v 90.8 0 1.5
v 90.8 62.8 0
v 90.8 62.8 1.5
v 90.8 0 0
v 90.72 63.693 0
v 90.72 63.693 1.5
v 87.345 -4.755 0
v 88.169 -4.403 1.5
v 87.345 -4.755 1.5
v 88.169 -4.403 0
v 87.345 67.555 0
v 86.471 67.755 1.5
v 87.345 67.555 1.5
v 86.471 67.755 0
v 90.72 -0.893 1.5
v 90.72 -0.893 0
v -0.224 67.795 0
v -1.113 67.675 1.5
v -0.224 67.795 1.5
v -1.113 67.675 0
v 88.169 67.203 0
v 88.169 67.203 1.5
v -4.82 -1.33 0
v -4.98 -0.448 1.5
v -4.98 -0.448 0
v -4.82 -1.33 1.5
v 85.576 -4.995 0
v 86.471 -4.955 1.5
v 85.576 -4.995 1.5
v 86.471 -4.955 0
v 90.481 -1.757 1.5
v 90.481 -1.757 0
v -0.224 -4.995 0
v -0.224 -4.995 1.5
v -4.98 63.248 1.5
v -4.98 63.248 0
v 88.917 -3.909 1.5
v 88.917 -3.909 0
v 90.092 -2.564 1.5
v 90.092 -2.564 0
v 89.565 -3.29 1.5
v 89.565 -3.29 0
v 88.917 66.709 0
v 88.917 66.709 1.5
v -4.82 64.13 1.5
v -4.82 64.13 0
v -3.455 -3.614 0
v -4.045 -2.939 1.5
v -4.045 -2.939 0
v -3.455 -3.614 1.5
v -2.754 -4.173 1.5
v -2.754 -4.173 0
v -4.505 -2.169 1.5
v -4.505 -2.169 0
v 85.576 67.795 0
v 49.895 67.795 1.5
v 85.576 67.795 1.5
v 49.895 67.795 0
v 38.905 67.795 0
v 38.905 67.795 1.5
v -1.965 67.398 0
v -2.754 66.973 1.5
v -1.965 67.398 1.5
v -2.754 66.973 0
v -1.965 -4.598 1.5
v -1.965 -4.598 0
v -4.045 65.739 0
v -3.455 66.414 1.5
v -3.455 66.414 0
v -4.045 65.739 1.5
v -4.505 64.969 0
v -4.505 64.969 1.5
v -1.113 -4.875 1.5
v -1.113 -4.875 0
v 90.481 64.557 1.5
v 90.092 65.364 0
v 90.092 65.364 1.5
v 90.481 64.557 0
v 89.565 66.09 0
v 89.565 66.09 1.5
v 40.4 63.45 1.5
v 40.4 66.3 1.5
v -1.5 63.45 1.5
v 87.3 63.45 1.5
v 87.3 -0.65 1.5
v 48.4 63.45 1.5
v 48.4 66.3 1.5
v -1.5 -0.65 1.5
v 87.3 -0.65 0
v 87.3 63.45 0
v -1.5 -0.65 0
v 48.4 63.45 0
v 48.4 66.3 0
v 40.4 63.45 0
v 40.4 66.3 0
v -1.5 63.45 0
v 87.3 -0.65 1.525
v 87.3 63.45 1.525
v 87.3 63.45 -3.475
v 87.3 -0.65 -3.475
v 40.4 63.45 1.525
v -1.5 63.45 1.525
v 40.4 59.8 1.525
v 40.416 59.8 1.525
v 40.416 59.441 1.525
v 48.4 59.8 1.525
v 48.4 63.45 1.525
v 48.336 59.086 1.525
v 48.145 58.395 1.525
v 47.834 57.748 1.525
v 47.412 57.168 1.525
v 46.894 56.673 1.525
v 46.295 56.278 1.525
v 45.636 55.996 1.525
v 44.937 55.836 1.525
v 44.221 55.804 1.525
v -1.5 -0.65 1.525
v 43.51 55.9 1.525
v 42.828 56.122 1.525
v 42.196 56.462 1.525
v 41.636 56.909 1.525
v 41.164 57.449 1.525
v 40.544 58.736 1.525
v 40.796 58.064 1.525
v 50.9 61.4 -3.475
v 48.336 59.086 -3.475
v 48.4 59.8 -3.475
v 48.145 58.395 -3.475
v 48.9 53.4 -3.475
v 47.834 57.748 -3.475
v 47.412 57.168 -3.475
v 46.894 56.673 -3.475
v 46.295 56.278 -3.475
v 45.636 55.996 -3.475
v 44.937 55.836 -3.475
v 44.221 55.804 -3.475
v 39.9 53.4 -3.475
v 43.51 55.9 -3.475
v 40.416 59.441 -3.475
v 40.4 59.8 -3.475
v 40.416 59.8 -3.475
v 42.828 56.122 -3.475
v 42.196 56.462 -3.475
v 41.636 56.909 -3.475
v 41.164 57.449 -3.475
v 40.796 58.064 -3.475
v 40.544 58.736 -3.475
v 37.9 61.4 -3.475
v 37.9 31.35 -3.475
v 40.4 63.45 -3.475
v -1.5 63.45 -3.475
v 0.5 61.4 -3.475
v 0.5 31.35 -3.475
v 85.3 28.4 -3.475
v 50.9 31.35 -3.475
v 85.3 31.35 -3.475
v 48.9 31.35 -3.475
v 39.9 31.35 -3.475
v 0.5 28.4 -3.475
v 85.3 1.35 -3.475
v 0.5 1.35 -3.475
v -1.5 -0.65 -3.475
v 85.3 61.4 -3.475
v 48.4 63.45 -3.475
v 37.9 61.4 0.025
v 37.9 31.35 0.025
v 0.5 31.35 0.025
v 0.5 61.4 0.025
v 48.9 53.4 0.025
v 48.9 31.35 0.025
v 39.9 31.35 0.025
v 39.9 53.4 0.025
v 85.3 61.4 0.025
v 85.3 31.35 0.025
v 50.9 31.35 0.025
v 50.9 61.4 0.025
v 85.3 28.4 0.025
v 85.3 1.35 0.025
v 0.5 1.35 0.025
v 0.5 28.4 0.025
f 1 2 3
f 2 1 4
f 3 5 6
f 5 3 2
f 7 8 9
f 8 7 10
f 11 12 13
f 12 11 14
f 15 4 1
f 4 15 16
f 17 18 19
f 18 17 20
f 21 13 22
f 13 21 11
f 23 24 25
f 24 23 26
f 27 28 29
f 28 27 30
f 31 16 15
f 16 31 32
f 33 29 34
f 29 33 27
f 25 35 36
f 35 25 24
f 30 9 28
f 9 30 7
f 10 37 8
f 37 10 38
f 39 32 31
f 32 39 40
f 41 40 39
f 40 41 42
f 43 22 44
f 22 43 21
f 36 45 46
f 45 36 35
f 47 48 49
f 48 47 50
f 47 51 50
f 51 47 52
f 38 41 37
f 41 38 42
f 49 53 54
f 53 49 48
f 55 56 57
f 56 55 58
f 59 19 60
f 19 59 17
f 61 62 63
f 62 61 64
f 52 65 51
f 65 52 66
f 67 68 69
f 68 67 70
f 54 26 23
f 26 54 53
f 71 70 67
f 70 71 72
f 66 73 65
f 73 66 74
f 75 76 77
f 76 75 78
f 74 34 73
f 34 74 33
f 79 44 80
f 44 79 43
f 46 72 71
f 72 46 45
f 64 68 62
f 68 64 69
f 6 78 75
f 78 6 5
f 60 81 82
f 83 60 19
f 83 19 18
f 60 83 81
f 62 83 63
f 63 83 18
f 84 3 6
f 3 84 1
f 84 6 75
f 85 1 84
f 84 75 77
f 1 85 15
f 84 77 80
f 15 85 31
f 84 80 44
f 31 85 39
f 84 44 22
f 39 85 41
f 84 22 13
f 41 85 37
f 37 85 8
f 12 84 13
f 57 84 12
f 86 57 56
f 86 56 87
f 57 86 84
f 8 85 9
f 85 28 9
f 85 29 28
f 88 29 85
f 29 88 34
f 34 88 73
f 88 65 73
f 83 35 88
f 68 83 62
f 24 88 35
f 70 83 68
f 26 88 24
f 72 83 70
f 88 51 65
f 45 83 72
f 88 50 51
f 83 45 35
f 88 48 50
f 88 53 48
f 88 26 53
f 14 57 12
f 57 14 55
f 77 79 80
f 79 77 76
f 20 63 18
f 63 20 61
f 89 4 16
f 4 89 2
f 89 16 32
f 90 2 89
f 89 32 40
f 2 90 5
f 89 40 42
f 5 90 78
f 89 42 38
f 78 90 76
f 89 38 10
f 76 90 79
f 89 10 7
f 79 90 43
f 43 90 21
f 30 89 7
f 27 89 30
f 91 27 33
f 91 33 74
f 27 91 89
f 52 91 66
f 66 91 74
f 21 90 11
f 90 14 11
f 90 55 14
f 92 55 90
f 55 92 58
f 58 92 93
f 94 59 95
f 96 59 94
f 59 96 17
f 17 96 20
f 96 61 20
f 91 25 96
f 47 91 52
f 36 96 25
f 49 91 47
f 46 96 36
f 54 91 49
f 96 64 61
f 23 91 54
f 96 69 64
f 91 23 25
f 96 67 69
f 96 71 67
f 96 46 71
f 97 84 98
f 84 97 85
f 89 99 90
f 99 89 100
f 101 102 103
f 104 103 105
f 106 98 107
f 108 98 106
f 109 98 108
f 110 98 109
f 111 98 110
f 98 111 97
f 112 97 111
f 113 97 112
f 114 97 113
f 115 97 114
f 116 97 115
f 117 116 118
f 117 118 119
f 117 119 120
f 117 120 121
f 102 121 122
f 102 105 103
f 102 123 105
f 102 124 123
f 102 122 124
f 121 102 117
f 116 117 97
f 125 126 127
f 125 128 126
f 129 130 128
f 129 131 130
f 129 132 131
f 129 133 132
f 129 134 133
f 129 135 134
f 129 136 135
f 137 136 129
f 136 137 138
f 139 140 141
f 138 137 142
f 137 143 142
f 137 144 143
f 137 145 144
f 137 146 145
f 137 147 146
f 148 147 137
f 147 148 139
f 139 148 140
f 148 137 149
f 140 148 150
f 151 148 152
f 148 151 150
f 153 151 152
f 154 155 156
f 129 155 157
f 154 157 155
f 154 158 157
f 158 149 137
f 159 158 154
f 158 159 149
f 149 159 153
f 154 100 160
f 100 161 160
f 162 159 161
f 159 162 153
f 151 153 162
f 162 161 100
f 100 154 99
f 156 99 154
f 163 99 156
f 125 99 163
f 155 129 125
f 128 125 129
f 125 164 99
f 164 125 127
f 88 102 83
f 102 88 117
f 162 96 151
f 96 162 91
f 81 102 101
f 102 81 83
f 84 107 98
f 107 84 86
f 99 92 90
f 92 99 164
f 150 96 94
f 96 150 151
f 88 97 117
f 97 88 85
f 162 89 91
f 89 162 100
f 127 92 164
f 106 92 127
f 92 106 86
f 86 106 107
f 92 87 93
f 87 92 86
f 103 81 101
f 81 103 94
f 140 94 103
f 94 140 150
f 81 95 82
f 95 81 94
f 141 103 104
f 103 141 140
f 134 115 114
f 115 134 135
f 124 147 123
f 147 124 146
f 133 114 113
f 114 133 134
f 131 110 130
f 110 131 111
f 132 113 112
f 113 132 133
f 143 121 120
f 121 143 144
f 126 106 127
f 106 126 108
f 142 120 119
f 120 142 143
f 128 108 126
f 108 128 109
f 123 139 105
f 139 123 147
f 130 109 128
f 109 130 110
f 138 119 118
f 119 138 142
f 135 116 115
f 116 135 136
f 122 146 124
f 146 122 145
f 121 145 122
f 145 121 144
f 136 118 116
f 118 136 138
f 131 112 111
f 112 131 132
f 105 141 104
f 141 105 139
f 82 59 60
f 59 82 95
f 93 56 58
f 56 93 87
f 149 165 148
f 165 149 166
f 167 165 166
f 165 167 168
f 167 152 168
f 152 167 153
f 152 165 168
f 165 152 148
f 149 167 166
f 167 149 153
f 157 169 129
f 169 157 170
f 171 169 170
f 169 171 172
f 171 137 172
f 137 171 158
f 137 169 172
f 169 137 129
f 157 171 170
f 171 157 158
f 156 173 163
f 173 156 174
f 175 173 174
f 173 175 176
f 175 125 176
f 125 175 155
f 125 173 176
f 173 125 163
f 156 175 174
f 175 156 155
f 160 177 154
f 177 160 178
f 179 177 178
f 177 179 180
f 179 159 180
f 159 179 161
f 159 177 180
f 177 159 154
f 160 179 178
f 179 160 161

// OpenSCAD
$fn = 35;

// microclock v0.2
// buttons has two face buttons
// doFoot generates the "foot" or back case
// retainers makes the stubs to hold in parts (use hot glue instead)


buttons = 1;
doFoot = 1;

retainers = 0;

ease = .15;
acrylicGrowth = 1.5;


footInsetX = 0;
footInsetY = 0.85;


reflectorW = 87 + ease*2 + acrylicGrowth;
reflectorH = 44 + ease*2 + acrylicGrowth;
reflectorD = 10;

clockCoreD = 22; // 18;  7 - 22
coreOffset = [ 0, 0, -.5 ];

acrylicDepth = 3.175 + .3;

minkowskiR = 5;
wallThickness = 3;

reflectorOffset = [-wallThickness/2, -wallThickness/2, -acrylicDepth];

buttonsH = 20 * buttons;

coreCubeDim = [ reflectorW-wallThickness, reflectorH-wallThickness + buttonsH, clockCoreD ];

module reflector(depth = reflectorD) {
    translate(reflectorOffset)
        cube([reflectorW, reflectorH, depth]);
}

//reflectorShimLoc = [0, 0, 0];
aclp = .8;
reflectorShimLoc = [reflectorW/2, acrylicGrowth-1, reflectorD/2+acrylicDepth];
shimPath = [ [ -acrylicGrowth/2, -reflectorD/2+aclp ],
             [ -acrylicGrowth/2+aclp, -reflectorD/2 ],
             [  acrylicGrowth/2+1,  -reflectorD/2 ],
             [  acrylicGrowth/2+1,  reflectorD/2 ],
             [ -acrylicGrowth/2+aclp, reflectorD/2 ],
             [ -acrylicGrowth/2, reflectorD/2-aclp ]
            ];

module reflectorShim(depth = reflectorD) {
*    translate(reflectorShimLoc)
#        cube([reflectorW, acrylicGrowth, depth]);

    translate(reflectorOffset)
    translate(reflectorShimLoc)
    rotate([90, 180, 90])
    linear_extrude(height = reflectorW, center=true)
#        polygon(shimPath);
}

module acrylic(depth = acrylicDepth) {
    translate(reflectorOffset)
 #      cube([reflectorW, reflectorH, acrylicDepth]);
}

module ledMountSm() {
    ledSlop = 0.6;      // was .4
    ledMountR = (7 + ledSlop) / 2;
    ledMountD = 6.75;
    ledMountBaseR = 7.9 / 2;
    ledMountBaseH = 0.9;
    
    rotate([0, 180, 0])
        union() {
            cylinder(r = ledMountBaseR, h = ledMountBaseH);
            translate([0, 0, -ledMountD]) 
                cylinder(r = ledMountR, h = ledMountD);
        }
}

buttonsNegLoc = [ [ 0, 48, 0 ], [ 0, 45, acrylicDepth + 7 ] ];
buttonsNegDim = [ [ reflectorW, buttonsH-2, 20 ], [ reflectorW, buttonsH, 20 ], ];
buttonsNegNum = 1;

buttonsLoc = [ [ 15, 55, -5 ], [ reflectorW - 15, 55, -5 ] ];
buttonsNum = 1;

module buttonsNeg() {
    translate(reflectorOffset) {
        for (i=[0:1:buttonsNegNum])
            translate(buttonsNegLoc[i])
                cube(buttonsNegDim[i]);
    
        for (i=[0:1:buttonsNum])
            translate(buttonsLoc[i])
 #               ledMountSm();
    }
}

module baseBlock() {
    translate(coreOffset)
        minkowski() {
            cube(coreCubeDim);
            cylinder(r=minkowskiR, h=reflectorD, center=true);
        }
}

module core() {
    difference() {
        baseBlock();
        reflector(reflectorD+acrylicDepth+clockCoreD);
    }
}

retainerRadius = 2;
retainerLoc = [ 0, 0, reflectorD + retainerRadius ];

retainerGap = .5;
retainerGapThrow = 1.7;
retainerGapLoc = [ -6, - retainerGapThrow, reflectorD -.2 ];
retainerGapDim = [ 9, retainerGapThrow, 5 ];

retainerBarLocPos = [ -6, 0, -.65 ];
retainerBarDimPos = [ 6, 1, 1.3 ];
retainerBarLocNeg = [ -6, -1, -.65 - retainerGap ];
retainerBarDimNeg = [ 6, 2.5, 1.3 + 2*retainerGap ];

retainerWeldLoc = [ -.25, 0, -2.4 ];
retainerWeldLoc2 = [ -.25, 0, 2.0 ];
retainerWeldDim = [ .5, 1, .5 ];

module retainerNeg() {
    translate(retainerLoc)
        intersection() {
            union() {
                translate([0, .25, 0])
                sphere(r = retainerRadius+retainerGap);
                translate(retainerBarLocNeg)
                    cube(retainerBarDimNeg);
            }
            translate([-10+retainerRadius+retainerGap,0,-5])
                cube([10,10,10]);
        }
     translate(retainerGapLoc)
        cube(retainerGapDim);
}

module retainerPos() {
    translate(retainerLoc)
        difference() {
            intersection() {
                union() {
                 translate([0, .25, 0])
                   sphere(r = retainerRadius);
                    translate(retainerBarLocPos)
                        cube(retainerBarDimPos);
                    translate(retainerWeldLoc)
   #                     cube(retainerWeldDim);
                    translate(retainerWeldLoc2)
   #                     cube(retainerWeldDim);
                }
                translate([-10+retainerRadius+retainerGap,0,-5])
                    cube([10,2,8]);
            }
        }
}

retainersLoc = [ [ 20, -1.18, -6 ], [ 70, -1.18, -6 ],
                [ 15, 45.3, -13], [65, 45.3, -13],
];
retainerRot = [ [ 0, 0, 0], [0, 0, 0], 
            [ 0, 0, 180], [0, 0, 180] ];
retainersNum = 3;

module retainersNeg() {
    for (i=[0:1:retainersNum])
        translate(retainersLoc[i])
            rotate(retainerRot[i])
            retainerNeg();
}

module retainersPos() {
    for (i=[0:1:retainersNum])
        translate(retainersLoc[i])
            rotate(retainerRot[i])
            retainerPos();
}

module viewPort() {
    viewPortLoc = [ minkowskiR+2, minkowskiR+1.5, -2 ];
    viewPortDim = [ reflectorW-minkowskiR*2-7, reflectorH-minkowskiR*2-7, 12 ];
    translate(viewPortLoc)
        minkowski() {
            cube(viewPortDim);
            cylinder(r=minkowskiR, h=clockCoreD, center=true);
        }
}

cornersReliefH = clockCoreD + acrylicDepth + 2;
cornersReliefR = 1;
    cornersLoc = [ [ -wallThickness/2, 0, cornersReliefH/2 - acrylicDepth ],
                   [ -wallThickness/2, reflectorH  -wallThickness/2, cornersReliefH/2 - acrylicDepth ],
                   [ -wallThickness/2 + reflectorW, 0, cornersReliefH/2 - acrylicDepth ],
                   [ -wallThickness/2 + reflectorW, reflectorH  -wallThickness/2, cornersReliefH/2 - acrylicDepth ] ];
cornerReliefNum = 3;
cornersRot = [ 0, 0, 0 ];

module cornersRelief() {
    for (i=[0:1:cornerReliefNum])
        translate(cornersLoc[i])
            rotate(cornersRot)
#                cylinder(h=cornersReliefH, r=cornersReliefR, center=true);
}



footWall = 2;
footH = buttonsH+reflectorH;

module footStep(step) {
    if (step == 1) {        // main lump
        translate([0, 0, -28])
            difference() {
                 translate([0, 0, 3])
                    baseBlock();
  *              core();
                translate([-5, -10, -4])
                    cube([reflectorW+10, footH+15, 32]);      
            }
        translate([footInsetX, footInsetY, 0])
            translate(reflectorOffset)
               cube([reflectorW-2*footInsetX, footH-2*footInsetY, 5]);
    }
    else if (step == 2) {       // cable cutout
        translate([(reflectorW-8)/2, reflectorH+buttonsH-6, -5]) {  // 14
           cube([8, 8, 18]);
            translate([4, 0, 0])
                cylinder(r=4, h=18);
    #        translate([4, 2.5, 0])
                rotate([0, 0, 45])
                    cube([8, 8, 18]);
        }
    }
    else if (step == 3) {       //hollow
        translate(reflectorOffset)
            translate([footInsetX+footWall, footInsetY+footWall, -1.5]) {
    #           cube([reflectorW-2*footInsetX-2*footWall, (footH-2*footInsetY-2*footWall)/2-3, 5]);
            translate([0, 20 + (buttons*10), 0]) { // [0, 30, 0] for footed
    #           cube([(reflectorW-2*footInsetX-2*footWall)/2-5, (footH-2*footInsetY-2*footWall)/2, 5]);
                translate([(reflectorW-2*footInsetX-2*footWall)/2-3, 0, 0])
                    #           cube([9, (footH-2*footInsetY-2*footWall)/2-8, 5]);
                translate([(reflectorW-2*footInsetX-2*footWall)/2+8, 0, 0])
                    #           cube([(reflectorW-2*footInsetX-2*footWall)/2-8, (footH-2*footInsetY-2*footWall)/2, 5]);

            }
        }
    }
}

module foot() {
    difference() {
        footStep(1);
        footStep(2);
        footStep(3);
    }
}


module doIt() {
    difference() {
        union() {
            core();
 *           #reflector();
 *           #acrylic();
            reflectorShim();
        }
        if (retainers)
            retainersNeg();
        viewPort();
        buttonsNeg();
        cornersRelief();
    }
    if (retainers)
        retainersPos();
}


// middle
// sectL = [ -5, -5, 5 ];
// sectD = [reflectorW*2+10, reflectorW*2+6+10, 2];
// vertical
sectL = [ 33, -5, -40 ];
sectD = [ 20, reflectorW*2+10, reflectorW*2+10];

takeSlice = 0;
test = 0;

if (test) {
    reflector();
}
else {
    if (takeSlice) {
        intersection() {
            doIt();
            translate(sectL)
                cube(sectD);
        }
    }
    else {
        if (doFoot)
            foot();
        else
            doIt();
    }
}
